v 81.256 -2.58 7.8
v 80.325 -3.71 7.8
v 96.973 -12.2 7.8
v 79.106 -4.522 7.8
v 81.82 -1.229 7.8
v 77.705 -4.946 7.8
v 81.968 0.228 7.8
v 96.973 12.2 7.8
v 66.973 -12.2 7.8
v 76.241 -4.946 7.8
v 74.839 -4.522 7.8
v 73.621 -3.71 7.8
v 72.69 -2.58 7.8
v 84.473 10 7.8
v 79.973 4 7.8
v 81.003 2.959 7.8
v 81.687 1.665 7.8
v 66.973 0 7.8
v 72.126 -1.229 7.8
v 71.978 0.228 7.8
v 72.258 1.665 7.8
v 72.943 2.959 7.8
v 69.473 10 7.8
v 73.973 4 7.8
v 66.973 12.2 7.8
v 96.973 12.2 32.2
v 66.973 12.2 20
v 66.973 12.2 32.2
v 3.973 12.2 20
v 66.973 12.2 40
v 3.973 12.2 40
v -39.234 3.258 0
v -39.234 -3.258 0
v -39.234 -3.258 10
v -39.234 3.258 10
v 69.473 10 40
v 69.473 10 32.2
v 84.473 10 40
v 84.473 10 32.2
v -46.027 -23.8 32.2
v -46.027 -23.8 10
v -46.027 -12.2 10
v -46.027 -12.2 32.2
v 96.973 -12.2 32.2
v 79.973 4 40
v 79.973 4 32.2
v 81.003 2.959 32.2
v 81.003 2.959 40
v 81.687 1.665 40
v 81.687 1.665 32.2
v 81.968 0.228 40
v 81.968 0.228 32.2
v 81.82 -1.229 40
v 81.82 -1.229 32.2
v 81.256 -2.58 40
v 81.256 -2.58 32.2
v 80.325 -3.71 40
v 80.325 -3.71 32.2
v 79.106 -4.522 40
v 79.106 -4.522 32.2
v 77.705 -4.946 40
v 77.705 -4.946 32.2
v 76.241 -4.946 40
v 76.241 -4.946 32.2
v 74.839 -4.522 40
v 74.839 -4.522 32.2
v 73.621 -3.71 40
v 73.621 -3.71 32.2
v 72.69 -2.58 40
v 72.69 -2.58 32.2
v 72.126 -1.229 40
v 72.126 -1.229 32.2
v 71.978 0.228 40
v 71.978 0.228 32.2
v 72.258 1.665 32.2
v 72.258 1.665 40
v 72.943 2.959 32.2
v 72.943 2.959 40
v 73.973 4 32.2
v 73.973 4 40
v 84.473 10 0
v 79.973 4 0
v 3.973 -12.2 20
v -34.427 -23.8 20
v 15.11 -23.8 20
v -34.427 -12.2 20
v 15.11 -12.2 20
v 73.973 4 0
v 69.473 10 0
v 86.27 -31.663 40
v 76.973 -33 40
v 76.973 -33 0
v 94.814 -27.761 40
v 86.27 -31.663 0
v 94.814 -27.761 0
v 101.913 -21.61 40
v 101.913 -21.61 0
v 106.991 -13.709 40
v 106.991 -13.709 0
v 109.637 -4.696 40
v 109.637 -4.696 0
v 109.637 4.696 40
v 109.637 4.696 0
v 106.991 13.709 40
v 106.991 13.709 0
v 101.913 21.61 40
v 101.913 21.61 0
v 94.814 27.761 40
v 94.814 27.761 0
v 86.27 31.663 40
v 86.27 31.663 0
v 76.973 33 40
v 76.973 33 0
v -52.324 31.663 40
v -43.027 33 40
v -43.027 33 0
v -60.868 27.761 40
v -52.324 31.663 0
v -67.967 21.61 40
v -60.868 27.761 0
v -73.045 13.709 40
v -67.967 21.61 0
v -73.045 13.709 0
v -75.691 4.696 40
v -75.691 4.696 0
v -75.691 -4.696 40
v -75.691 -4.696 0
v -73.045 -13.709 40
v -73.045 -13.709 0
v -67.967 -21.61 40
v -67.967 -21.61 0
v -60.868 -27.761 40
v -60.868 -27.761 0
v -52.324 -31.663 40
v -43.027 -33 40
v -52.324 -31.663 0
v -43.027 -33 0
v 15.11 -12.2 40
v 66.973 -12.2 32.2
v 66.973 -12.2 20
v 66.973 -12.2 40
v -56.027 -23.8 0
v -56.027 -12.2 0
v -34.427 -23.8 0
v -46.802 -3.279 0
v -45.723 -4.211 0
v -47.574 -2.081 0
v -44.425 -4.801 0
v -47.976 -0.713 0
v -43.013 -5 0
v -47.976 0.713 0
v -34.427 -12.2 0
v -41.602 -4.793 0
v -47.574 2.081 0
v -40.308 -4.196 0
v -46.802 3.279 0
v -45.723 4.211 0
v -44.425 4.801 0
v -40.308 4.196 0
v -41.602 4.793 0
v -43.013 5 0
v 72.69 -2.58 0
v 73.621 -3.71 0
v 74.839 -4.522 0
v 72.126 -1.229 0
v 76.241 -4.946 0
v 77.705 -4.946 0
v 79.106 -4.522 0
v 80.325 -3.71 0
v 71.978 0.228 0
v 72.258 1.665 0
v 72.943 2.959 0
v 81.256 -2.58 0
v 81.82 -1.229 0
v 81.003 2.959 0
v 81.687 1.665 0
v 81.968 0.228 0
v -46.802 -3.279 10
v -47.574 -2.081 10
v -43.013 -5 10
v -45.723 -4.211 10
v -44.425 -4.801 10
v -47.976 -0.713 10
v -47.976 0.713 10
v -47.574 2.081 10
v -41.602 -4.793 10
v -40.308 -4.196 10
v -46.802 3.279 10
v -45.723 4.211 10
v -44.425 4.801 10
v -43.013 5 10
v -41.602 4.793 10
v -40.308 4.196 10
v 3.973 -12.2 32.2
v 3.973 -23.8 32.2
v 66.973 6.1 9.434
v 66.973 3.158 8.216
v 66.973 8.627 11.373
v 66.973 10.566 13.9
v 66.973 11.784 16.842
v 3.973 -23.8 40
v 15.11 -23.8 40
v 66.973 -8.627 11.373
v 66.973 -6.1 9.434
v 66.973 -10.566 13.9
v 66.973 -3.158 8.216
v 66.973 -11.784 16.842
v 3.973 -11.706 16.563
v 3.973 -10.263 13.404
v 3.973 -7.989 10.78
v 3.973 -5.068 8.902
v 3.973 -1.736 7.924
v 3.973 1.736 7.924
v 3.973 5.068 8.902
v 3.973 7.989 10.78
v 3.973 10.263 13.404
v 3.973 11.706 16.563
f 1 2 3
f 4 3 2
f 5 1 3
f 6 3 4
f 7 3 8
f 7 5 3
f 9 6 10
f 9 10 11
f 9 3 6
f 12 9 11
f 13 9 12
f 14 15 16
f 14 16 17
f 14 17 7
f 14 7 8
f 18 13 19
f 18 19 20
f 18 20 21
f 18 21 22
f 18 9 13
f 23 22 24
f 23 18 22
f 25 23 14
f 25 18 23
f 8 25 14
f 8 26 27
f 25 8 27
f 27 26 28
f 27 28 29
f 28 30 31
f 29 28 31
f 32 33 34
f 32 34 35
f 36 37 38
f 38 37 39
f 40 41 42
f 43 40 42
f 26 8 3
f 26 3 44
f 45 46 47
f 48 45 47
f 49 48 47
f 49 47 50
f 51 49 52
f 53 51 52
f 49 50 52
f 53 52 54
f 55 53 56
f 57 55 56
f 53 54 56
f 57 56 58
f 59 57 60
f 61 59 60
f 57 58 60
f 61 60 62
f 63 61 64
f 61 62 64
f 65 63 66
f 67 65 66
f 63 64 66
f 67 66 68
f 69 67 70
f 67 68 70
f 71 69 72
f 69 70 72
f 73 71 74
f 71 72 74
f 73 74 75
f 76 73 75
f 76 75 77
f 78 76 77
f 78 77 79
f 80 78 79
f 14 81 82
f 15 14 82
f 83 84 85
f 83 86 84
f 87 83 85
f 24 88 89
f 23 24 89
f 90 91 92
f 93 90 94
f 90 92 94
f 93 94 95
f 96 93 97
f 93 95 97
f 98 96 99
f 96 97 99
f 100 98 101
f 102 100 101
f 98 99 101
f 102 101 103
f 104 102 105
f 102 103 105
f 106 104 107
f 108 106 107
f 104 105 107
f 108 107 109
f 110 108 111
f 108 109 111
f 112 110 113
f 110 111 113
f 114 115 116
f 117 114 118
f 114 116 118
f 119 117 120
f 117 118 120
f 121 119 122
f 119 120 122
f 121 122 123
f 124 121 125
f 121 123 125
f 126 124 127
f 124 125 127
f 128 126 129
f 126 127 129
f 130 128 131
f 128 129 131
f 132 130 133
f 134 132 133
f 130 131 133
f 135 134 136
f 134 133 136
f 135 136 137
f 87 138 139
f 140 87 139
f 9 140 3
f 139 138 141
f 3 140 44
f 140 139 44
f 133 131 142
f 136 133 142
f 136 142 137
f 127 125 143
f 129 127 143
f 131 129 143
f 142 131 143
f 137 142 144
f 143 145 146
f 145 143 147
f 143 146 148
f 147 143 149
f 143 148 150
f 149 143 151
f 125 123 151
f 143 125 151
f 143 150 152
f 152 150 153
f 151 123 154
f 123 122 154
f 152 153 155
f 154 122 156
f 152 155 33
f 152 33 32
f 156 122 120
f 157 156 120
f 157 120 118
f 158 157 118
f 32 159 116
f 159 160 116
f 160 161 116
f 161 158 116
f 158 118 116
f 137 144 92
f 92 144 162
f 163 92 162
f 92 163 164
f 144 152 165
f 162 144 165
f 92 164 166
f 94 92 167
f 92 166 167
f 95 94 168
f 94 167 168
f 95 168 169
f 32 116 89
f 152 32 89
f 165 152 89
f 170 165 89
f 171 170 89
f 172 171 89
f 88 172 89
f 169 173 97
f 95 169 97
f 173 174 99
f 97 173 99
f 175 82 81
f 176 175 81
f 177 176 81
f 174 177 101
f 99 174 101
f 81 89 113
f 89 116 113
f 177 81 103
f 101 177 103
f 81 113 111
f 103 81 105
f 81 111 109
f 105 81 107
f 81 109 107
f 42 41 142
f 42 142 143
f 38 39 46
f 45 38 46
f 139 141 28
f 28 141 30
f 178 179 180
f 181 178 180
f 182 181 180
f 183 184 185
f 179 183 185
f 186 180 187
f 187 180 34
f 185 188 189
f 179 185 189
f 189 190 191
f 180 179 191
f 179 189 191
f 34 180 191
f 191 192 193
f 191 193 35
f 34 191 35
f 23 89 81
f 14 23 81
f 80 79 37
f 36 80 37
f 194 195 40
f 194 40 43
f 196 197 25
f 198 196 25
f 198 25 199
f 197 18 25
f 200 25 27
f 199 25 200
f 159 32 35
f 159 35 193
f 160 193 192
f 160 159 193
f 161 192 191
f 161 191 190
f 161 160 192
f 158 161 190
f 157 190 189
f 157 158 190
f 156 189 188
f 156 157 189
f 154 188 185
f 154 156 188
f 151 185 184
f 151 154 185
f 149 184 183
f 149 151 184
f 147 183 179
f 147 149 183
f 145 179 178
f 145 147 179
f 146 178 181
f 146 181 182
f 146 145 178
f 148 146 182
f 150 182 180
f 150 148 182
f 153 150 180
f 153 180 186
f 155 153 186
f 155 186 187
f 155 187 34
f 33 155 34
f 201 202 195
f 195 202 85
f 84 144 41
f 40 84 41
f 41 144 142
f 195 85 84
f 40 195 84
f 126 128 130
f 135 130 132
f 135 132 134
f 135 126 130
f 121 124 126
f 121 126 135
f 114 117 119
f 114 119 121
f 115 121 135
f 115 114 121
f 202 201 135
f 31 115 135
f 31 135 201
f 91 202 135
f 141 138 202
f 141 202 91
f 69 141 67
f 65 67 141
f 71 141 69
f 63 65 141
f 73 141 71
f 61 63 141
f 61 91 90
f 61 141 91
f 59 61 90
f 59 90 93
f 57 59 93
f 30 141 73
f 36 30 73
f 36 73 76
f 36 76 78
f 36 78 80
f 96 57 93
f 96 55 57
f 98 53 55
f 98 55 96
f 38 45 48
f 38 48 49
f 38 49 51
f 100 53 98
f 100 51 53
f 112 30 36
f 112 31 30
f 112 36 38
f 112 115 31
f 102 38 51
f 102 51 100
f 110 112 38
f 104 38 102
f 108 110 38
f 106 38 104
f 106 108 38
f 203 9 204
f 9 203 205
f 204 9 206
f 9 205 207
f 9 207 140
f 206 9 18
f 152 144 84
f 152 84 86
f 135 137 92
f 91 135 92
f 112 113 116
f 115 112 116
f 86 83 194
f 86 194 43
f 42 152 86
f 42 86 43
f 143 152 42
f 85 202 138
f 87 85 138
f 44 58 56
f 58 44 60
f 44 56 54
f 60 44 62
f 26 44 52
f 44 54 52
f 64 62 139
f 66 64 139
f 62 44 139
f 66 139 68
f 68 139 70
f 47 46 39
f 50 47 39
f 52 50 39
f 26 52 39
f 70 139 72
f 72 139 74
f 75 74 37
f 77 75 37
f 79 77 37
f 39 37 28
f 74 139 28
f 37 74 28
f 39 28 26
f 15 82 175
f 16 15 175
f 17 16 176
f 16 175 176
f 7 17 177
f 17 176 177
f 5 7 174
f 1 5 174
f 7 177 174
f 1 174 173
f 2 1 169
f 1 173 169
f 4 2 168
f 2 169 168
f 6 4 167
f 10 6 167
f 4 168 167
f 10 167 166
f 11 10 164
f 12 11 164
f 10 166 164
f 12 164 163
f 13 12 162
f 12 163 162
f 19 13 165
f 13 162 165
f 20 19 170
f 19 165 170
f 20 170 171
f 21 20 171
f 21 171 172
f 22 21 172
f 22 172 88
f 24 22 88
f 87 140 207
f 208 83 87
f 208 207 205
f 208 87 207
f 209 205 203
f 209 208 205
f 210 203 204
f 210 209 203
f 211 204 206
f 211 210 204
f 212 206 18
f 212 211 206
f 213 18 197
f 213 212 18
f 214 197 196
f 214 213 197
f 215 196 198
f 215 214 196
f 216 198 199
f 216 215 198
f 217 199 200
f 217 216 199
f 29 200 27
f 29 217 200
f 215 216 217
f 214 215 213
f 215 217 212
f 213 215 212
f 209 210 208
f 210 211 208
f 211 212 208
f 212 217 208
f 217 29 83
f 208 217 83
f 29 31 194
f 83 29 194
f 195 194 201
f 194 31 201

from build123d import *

# Parameters (mm, degrees)
SALIENTE_EXTRUIR1_DEPTH = 40
CORTAR_EXTRUIR2_DEPTH   = 10
CORTAR_EXTRUIR4_DEPTH   = 20
CROQUIS6_R              = 12.2
CORTAR_EXTRUIR6_DEPTH   = 63
CROQUIS7_W              = 24.4
CROQUIS7_H              = 24.4
CORTAR_EXTRUIR9_DEPTH   = 30
CROQUIS8_W              = 12.2
CROQUIS8_H              = 11.6
CORTAR_EXTRUIR10_DEPTH  = 50
CORTAR_EXTRUIR11_REACH  = 123.586
CROQUIS9_W              = 11.6
CROQUIS9_H              = 11.6
CHAFL_N1_SIZE           = 10


with BuildPart() as part:
    # Croquis1 → Saliente-Extruir1 (new body)
    with BuildSketch(Plane.XY):
        with BuildLine():
            Line((76.972889038, 33), (-43.027110962, 33))
            ThreePointArc((-43.027110962, 33), (-76.027110962, 0), (-43.027110962, -33))
            Line((-43.027110962, -33), (76.972889038, -33))
            ThreePointArc((76.972889038, -33), (109.972889038, 0), (76.972889038, 33))
        make_face()
        with BuildLine():
            Line((69.472889038, 10), (84.472889038, 10))
            Line((84.472889038, 10), (79.972889038, 4))
            ThreePointArc((79.972889038, 4), (76.972889038, -5), (73.972889038, 4))
            Line((73.972889038, 4), (69.472889038, 10))
        make_face(mode=Mode.SUBTRACT)
    extrude(amount=SALIENTE_EXTRUIR1_DEPTH)

    # Croquis1<4> → Cortar-Extruir2 (cut)
    with BuildSketch(Plane.XY):
        with BuildLine():
            Line((-39.234058455, -3.257722008), (-39.234058455, 3.257722008))
            ThreePointArc((-39.234058455, 3.257722008), (-48.027110962, 0), (-39.234058455, -3.257722008))
        make_face()
    extrude(amount=CORTAR_EXTRUIR2_DEPTH, mode=Mode.SUBTRACT)

    # Croquis5 → Cortar-Extruir4 (cut)
    with BuildSketch(Plane.XY.offset(40)):
        Polygon((66.972889038, -12.2), (66.972889038, 12.2), (3.972889038, 12.2), (3.972889038, -23.8), (15.110447518, -23.8), (15.110447518, -12.2), align=None)
    extrude(amount=-CORTAR_EXTRUIR4_DEPTH, mode=Mode.SUBTRACT)

    # Croquis6 → Cortar-Extruir6 (cut)
    with BuildSketch(Plane(origin=(3.972889038, 0, 0), x_dir=(0, 0, -1), z_dir=(1, 0, 0))):
        with Locations((-20, 0)):
            Circle(CROQUIS6_R)
        with BuildLine():
            ThreePointArc((-20, -12.2), (-32.2, 0), (-20, 12.2))
            Line((-20, 12.2), (-40, 12.2))
            Line((-40, 12.2), (-40, -12.2))
            Line((-40, -12.2), (-20, -12.2))
        make_face()
    extrude(amount=CORTAR_EXTRUIR6_DEPTH, mode=Mode.SUBTRACT)

    # Croquis7 → Cortar-Extruir9 (cut)
    with BuildSketch(Plane.ZY.offset(-66.972889038)):
        with Locations((20, 0)):
            Rectangle(CROQUIS7_W, CROQUIS7_H)
    extrude(amount=-CORTAR_EXTRUIR9_DEPTH, mode=Mode.SUBTRACT)

    # Croquis8 → Cortar-Extruir10 (cut)
    with BuildSketch(Plane(origin=(3.972889038, 0, 0), x_dir=(0, 0, -1), z_dir=(1, 0, 0))):
        with Locations((-26.1, -18)):
            Rectangle(CROQUIS8_W, CROQUIS8_H)
    extrude(amount=-CORTAR_EXTRUIR10_DEPTH, mode=Mode.SUBTRACT)

    # Croquis9 → Cortar-Extruir11 (cut, up to next)
    with BuildSketch(Plane(origin=(0, 0, 0), x_dir=(-1, 0, 0), z_dir=(0, 0, -1)), mode=Mode.PRIVATE) as cortar_extruir11_sk1:
        with Locations((40.227110962, -18)):
            Rectangle(CROQUIS9_W, CROQUIS9_H)
    cortar_extruir11_tool1 = extrude(cortar_extruir11_sk1.sketch, amount=-CORTAR_EXTRUIR11_REACH, mode=Mode.PRIVATE) & part.part
    add(cortar_extruir11_tool1.solids().sort_by_distance((-40.227111, -18, 0))[0], mode=Mode.SUBTRACT)

    # Chaflán1
    chafl_n1_edges = [part.edges().sort_by_distance(p)[0] for p in [
        (-46.027110962, -18, 0),
    ]]
    chamfer(chafl_n1_edges, length=CHAFL_N1_SIZE)


solid = part.part
